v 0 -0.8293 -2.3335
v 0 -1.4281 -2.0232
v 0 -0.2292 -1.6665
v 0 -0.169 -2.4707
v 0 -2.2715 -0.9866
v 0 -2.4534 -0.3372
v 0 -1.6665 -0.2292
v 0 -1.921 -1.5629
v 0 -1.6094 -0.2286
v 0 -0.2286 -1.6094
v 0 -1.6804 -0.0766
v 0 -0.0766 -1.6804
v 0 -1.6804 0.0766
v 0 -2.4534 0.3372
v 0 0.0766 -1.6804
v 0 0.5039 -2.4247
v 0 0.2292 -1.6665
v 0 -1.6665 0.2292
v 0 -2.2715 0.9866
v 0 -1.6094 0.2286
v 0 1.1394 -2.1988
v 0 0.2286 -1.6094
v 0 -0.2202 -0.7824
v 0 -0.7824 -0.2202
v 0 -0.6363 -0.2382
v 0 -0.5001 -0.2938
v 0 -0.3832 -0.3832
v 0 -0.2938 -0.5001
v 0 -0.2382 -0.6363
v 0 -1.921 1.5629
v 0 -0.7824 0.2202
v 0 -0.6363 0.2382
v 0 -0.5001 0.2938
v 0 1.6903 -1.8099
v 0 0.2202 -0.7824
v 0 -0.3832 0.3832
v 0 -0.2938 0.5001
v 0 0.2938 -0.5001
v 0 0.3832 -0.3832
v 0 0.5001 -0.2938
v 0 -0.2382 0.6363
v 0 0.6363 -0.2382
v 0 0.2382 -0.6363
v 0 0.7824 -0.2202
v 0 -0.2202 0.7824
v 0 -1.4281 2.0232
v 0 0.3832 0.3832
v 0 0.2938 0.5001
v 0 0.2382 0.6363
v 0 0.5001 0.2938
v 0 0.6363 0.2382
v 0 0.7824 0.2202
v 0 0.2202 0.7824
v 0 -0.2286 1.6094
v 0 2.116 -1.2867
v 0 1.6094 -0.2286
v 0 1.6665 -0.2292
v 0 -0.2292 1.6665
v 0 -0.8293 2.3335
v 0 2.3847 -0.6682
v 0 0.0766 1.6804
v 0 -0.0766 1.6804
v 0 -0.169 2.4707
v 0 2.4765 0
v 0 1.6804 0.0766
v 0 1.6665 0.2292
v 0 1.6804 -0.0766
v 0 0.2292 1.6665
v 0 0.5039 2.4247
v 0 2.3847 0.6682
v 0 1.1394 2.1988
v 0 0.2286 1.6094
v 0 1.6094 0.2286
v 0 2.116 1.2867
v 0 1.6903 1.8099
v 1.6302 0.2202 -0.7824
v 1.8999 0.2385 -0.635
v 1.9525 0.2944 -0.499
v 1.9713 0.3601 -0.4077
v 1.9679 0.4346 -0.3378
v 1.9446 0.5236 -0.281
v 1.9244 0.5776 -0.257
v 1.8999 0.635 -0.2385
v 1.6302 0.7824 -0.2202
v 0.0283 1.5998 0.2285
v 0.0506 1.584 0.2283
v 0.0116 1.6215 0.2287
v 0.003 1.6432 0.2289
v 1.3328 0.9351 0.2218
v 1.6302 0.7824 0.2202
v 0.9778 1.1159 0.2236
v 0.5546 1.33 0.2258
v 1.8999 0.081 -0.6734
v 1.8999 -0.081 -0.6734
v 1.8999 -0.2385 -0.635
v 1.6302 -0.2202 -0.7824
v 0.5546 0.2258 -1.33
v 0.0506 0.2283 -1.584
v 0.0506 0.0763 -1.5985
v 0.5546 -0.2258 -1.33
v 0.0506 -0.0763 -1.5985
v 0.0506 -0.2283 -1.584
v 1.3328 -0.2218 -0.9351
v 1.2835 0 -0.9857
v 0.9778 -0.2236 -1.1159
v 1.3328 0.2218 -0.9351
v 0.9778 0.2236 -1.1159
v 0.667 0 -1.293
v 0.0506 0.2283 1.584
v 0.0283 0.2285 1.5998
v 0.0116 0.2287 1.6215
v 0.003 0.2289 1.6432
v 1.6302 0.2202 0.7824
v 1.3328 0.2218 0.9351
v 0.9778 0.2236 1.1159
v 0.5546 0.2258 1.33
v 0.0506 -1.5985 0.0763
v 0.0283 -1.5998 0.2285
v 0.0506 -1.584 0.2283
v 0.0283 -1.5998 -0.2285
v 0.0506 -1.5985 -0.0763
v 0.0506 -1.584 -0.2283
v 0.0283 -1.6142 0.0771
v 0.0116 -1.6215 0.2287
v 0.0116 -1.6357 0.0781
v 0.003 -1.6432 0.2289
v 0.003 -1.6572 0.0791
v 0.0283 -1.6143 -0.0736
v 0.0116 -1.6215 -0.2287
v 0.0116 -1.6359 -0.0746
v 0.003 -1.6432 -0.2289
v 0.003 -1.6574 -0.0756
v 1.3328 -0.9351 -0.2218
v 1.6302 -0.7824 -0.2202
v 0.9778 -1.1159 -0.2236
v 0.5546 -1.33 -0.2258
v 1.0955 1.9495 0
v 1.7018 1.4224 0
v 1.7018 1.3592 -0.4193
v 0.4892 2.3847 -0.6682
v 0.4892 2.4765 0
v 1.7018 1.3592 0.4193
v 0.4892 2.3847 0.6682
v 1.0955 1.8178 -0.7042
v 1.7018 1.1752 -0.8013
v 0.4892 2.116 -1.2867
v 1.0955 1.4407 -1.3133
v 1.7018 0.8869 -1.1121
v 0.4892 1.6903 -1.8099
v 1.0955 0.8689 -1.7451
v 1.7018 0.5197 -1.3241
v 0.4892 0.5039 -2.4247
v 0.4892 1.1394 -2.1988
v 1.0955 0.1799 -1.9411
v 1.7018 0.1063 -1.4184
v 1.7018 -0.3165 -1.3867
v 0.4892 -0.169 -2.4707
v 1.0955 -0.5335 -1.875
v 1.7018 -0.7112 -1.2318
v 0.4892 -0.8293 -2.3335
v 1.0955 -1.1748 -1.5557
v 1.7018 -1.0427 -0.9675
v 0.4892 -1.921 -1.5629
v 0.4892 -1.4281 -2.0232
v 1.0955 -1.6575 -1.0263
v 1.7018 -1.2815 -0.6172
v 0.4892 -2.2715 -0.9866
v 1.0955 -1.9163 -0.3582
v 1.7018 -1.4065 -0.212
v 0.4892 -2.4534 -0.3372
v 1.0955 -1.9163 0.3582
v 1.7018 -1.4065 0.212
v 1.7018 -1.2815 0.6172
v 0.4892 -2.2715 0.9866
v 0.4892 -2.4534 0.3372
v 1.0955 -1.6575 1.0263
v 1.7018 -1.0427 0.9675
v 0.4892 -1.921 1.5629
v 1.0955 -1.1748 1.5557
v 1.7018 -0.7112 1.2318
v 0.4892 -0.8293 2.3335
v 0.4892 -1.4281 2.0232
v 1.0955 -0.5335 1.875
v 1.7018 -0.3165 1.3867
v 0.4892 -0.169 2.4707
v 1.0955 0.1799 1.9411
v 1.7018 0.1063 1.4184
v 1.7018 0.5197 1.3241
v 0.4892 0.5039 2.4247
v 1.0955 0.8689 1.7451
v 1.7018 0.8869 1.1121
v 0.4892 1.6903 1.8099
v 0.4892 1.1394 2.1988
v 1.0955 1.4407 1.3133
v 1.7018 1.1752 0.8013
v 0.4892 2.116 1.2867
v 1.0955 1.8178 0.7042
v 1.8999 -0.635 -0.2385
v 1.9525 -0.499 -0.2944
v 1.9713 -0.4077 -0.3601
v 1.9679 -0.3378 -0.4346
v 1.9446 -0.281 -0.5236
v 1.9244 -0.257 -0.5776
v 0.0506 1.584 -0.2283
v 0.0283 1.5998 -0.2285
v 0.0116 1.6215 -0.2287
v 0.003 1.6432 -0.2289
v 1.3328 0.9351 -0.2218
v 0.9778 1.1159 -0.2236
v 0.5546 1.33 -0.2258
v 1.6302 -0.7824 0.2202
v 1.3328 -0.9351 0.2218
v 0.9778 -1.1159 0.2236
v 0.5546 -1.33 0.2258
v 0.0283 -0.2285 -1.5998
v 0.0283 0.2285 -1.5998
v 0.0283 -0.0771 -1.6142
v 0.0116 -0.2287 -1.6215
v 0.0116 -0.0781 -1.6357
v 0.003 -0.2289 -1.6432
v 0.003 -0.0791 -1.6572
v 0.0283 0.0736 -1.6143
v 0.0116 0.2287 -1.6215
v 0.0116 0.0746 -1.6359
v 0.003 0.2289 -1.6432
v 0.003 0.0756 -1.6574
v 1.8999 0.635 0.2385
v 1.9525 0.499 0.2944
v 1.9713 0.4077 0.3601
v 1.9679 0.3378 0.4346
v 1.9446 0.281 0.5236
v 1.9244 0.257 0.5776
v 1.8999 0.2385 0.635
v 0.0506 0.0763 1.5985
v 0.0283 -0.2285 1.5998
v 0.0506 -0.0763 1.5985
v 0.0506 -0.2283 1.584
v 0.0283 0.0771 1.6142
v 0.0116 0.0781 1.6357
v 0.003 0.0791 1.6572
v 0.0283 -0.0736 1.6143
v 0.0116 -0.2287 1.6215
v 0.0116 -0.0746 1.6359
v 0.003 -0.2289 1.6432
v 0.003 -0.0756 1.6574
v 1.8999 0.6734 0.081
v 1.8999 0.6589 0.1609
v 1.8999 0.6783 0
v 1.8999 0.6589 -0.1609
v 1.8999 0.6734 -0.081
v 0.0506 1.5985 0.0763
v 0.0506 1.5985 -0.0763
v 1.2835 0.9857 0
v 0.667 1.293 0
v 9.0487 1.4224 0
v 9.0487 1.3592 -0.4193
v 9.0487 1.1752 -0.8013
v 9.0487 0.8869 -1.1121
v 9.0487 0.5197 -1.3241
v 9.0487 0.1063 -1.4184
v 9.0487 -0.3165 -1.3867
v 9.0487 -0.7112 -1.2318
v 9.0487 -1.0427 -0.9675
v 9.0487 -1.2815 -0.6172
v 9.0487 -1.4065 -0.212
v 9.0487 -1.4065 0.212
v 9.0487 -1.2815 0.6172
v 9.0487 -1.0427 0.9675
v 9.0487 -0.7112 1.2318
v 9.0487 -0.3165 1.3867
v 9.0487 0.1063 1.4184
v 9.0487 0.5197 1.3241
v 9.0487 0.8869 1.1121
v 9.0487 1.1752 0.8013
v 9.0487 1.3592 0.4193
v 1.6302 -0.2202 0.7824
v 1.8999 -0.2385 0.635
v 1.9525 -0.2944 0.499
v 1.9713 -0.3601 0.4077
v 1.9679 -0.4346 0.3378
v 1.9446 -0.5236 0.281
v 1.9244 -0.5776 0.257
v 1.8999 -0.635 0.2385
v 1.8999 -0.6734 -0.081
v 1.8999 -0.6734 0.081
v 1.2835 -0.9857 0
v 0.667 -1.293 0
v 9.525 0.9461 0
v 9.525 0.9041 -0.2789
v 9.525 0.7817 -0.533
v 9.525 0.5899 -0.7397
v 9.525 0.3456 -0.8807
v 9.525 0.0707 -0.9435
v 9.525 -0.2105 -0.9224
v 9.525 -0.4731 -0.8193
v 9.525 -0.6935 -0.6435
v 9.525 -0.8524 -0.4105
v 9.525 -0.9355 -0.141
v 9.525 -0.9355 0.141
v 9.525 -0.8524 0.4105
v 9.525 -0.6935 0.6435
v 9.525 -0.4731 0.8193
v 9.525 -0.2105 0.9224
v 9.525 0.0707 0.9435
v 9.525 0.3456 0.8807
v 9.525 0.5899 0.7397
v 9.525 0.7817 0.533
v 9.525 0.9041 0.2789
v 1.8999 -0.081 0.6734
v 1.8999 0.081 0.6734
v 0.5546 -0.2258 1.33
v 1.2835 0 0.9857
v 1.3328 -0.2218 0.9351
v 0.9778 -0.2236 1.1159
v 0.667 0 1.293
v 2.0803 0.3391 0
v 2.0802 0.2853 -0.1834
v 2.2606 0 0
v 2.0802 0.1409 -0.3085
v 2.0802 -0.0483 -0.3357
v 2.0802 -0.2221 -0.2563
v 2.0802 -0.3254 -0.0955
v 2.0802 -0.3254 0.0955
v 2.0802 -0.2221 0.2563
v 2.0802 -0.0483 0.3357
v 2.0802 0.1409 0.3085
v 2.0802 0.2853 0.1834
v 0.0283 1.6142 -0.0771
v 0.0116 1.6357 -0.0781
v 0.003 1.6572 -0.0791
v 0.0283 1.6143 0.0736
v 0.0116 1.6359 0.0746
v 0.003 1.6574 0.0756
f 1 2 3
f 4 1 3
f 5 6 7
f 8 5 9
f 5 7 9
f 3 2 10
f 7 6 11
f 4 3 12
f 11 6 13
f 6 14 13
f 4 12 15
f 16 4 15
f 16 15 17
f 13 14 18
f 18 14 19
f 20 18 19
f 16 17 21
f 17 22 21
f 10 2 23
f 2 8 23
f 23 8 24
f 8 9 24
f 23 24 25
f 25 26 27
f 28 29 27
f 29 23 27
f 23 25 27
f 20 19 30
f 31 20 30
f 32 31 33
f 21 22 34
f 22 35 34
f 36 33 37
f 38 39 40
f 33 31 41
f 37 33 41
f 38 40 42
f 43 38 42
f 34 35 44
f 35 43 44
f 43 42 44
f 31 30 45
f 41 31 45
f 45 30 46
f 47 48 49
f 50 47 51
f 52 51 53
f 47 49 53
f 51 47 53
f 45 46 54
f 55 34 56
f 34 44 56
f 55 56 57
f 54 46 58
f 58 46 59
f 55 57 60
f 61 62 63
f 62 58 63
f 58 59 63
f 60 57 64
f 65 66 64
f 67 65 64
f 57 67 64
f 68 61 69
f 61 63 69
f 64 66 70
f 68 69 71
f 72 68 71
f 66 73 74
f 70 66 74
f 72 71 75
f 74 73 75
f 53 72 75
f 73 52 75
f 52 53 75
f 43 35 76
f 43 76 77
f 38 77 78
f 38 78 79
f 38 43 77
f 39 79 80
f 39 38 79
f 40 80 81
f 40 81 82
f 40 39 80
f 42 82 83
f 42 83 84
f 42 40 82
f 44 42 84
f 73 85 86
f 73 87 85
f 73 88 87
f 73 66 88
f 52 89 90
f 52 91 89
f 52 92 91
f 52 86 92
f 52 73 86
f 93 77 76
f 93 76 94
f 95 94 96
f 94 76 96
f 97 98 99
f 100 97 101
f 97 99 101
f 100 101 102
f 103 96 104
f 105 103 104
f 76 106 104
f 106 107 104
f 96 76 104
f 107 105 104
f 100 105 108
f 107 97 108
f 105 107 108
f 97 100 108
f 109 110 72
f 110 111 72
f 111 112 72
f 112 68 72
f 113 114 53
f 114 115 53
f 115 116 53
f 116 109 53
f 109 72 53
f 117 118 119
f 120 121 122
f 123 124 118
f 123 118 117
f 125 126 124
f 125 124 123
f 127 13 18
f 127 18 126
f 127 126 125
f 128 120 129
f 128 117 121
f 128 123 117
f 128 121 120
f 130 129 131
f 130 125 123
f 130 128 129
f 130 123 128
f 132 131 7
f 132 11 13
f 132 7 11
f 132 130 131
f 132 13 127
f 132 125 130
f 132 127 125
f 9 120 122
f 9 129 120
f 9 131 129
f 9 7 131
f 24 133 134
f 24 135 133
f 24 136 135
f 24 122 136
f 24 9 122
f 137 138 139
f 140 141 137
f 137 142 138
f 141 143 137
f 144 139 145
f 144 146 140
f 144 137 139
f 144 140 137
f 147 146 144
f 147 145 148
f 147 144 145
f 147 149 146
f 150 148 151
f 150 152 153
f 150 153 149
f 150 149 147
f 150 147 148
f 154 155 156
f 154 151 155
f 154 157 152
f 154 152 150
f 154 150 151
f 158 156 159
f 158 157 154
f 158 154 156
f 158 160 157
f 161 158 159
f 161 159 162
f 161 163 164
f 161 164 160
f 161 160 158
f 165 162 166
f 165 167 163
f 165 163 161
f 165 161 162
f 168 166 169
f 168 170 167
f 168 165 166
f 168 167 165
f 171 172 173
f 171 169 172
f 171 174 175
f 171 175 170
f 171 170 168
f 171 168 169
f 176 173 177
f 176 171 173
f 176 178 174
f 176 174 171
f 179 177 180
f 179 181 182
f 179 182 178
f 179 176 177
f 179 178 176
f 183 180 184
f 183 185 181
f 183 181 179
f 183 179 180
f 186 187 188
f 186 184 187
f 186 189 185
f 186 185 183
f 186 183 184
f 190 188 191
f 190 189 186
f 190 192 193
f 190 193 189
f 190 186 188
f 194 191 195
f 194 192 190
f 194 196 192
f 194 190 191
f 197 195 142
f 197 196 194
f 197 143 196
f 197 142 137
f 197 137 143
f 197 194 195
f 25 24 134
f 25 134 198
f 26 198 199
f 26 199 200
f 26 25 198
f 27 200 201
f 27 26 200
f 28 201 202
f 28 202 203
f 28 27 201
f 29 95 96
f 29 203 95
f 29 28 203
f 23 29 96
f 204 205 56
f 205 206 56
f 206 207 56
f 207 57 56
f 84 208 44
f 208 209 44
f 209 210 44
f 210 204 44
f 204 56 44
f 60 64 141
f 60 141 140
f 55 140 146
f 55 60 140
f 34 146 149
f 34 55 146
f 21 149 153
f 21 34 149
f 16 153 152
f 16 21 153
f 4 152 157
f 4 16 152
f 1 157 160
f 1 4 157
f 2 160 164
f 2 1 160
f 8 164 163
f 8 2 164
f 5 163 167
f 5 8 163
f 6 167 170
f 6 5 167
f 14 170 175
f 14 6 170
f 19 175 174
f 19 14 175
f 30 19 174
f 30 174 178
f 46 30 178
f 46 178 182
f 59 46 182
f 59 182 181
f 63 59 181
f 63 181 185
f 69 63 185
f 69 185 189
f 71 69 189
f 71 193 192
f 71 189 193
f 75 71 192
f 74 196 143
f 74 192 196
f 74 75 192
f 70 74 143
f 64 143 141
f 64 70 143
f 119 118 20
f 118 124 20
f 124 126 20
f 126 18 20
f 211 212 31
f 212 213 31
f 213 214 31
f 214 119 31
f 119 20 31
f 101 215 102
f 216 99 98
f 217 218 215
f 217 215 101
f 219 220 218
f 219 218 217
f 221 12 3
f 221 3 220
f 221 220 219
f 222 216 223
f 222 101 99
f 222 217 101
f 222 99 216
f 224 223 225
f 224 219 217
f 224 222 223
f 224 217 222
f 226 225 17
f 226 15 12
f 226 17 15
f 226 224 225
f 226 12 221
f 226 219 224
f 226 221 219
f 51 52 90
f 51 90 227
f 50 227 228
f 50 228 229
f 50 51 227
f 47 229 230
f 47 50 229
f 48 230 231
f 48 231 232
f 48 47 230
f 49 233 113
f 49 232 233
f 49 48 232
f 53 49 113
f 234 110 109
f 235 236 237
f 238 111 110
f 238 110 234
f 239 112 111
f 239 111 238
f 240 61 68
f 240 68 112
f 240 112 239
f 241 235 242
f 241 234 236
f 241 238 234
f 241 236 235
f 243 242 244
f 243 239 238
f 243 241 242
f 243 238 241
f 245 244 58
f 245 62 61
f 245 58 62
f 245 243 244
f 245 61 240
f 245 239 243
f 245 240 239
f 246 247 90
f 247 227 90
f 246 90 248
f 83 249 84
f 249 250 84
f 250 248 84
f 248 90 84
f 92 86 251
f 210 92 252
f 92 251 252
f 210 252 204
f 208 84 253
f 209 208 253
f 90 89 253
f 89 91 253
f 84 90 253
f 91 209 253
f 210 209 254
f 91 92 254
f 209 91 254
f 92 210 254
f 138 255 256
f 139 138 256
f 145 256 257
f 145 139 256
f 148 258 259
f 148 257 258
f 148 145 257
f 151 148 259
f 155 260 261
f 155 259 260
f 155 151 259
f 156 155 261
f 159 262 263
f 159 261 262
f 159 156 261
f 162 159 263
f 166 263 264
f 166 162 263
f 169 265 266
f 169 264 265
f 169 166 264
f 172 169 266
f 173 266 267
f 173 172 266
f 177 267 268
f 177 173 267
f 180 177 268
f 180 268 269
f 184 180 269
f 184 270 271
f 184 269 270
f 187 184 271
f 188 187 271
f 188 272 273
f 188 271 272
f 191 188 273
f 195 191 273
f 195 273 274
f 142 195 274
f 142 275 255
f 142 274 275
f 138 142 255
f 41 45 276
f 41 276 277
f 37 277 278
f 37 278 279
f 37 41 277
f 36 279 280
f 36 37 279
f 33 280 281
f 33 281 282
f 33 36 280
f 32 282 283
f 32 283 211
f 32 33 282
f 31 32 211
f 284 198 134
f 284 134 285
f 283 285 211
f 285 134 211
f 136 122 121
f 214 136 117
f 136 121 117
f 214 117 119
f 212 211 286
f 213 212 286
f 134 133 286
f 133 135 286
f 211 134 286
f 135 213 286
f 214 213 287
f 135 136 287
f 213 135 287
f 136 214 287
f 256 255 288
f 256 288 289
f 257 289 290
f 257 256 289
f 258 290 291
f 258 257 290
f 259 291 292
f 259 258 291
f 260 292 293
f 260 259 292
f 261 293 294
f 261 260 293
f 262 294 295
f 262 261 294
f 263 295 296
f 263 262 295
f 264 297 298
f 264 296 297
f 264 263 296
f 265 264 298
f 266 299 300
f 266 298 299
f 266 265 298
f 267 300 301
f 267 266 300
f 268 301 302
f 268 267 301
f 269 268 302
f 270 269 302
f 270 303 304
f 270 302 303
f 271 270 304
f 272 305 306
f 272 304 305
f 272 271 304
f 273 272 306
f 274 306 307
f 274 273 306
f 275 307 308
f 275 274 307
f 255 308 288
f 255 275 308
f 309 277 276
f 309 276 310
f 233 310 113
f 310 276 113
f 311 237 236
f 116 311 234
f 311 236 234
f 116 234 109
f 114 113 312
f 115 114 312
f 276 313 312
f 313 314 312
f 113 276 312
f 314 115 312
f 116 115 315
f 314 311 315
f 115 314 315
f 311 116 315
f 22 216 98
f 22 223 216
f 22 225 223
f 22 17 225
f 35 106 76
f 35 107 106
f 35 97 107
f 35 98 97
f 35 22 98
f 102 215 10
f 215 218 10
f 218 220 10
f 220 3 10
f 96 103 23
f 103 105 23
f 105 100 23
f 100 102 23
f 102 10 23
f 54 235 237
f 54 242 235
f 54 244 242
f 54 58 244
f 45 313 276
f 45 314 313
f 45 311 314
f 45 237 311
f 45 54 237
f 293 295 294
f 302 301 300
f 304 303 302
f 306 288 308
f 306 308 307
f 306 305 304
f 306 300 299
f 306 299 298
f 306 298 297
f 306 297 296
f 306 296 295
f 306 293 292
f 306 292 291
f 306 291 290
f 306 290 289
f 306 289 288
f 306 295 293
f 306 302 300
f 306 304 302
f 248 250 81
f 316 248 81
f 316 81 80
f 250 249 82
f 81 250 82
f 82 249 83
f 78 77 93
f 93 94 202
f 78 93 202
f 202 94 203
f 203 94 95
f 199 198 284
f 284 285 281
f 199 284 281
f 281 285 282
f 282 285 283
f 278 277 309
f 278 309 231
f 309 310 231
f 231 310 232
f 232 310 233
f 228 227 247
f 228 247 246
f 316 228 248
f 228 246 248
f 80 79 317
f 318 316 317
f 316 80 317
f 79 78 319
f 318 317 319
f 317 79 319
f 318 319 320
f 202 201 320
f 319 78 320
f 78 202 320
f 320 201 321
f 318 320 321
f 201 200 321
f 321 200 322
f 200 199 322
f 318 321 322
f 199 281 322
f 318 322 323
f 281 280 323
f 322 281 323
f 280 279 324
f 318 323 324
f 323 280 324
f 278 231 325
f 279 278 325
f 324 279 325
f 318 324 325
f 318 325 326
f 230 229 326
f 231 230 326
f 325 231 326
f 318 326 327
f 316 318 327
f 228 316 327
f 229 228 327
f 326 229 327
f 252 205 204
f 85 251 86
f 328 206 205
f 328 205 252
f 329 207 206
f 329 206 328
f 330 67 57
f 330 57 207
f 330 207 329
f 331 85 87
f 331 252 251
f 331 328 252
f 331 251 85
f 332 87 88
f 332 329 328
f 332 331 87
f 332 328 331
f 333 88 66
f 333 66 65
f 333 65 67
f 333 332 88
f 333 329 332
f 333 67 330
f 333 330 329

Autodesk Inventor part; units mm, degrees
ref_plane "YZ Plane" through (0, 0, 0) normal (1, 0, 0) x (0, 1, 0)
ref_plane "XZ Plane" through (0, 0, 0) normal (0, 1, 0) x (-1, 0, 0)
sketch "Sketch1" plane through (0, 0, 0) normal (0, 0, 1) x (1, 0, 0)
  line L0 (2.2606, 0) -> (9.525, 0)
  line L1 (9.525, 0) -> (9.525, 1.4224)
  line L2 (9.525, 1.4224) -> (1.7018, 1.4224)
  line L3 (0.4892, 2.4765) -> (0, 2.4765)
  line L4 (-1.905, 0) -> (11.43, 0) projected
  line L5 (0, -0.4953) -> (0, 2.9718) projected
  line L6 (0, 1.6256) -> (1.8999, 0.6783)
  line L7 (1.8999, 0.6783) -> (2.2606, 0)
  line L8 (1.7018, 1.4224) -> (0.4892, 2.4765)
  line L9 (0, 2.4765) -> (0, 1.6256)
  dimension "d2" = 2.8448
  dimension "d3" = 4.953
  dimension "d4" = 2.2606
  dimension "d5" = 3.2512
  dimension "d6" = 26.5
  dimension "d7" = 62
  dimension "d13" = 41
  dimension "d14" = 1.7018
  dimension "d15" = 9.525
revolve "Body" add sketch "Sketch1" angle 360 about axis through (2.2606, 0, 0) along (1, 0, 0) contours L7 L6 L5 L3 L8 L2 L1 L0
sketch "Sketch2" plane through (0, 0, 0) normal (-1, 0, 0) x (0, 0, 1)
  line L0 (0, -3.4671) -> (0, 3.4671) projected
  line L1 (-3.4671, 0) -> (3.4671, 0) projected
  line L2 (0, 1.6256) -> (0, 0) construction
  line L3 (0, 0) -> (1.6256, 0) construction
  arc A0 (0.5419, 0) -> (0, 0.5419) centre (0, 0) ccw
  line L4 (0, 0) -> (0.7947, 0.7947) construction
  arc A1 (0.8128, 0) -> (0, 0.8128) centre (0, 0) ccw construction
  line L5 (0.2286, 1.6094) -> (0.2202, 0.7824)
  line L6 (1.6094, 0.2286) -> (0.7824, 0.2202)
  arc A2 (0.2202, 0.7824) -> (0.7824, 0.2202) centre (0.7767, 0.7767) ccw
  arc A3 (1.6256, 0) -> (1.6094, 0.2286) centre (0, 0) ccw
  arc A4 (0.2286, 1.6094) -> (0, 1.6256) centre (0, 0) ccw
  arc A5 (1.6094, 0.2286) -> (0.2286, 1.6094) centre (0, 0) ccw
  line L7 (0.2286, -1.6094) -> (0.2202, -0.7824)
  line L8 (1.6094, -0.2286) -> (0.7824, -0.2202)
  arc A6 (0.7824, -0.2202) -> (0.2202, -0.7824) centre (0.7767, -0.7767) ccw
  arc A7 (1.6094, -0.2286) -> (1.6256, 0) centre (0, 0) ccw
  arc A8 (0, -1.6256) -> (0.2286, -1.6094) centre (0, 0) ccw
  arc A9 (0.2286, -1.6094) -> (1.6094, -0.2286) centre (0, 0) ccw
  line L9 (-0.2286, 1.6094) -> (-0.2202, 0.7824)
  line L10 (-1.6094, 0.2286) -> (-0.7824, 0.2202)
  arc A10 (-0.7824, 0.2202) -> (-0.2202, 0.7824) centre (-0.7767, 0.7767) ccw
  arc A11 (-1.6094, 0.2286) -> (-1.6256, 0) centre (0, 0) ccw
  arc A12 (0, 1.6256) -> (-0.2286, 1.6094) centre (0, 0) ccw
  arc A13 (-0.2286, 1.6094) -> (-1.6094, 0.2286) centre (0, 0) ccw
  arc A14 (-1.6094, -0.2286) -> (-0.2286, -1.6094) centre (0, 0) ccw
  arc A15 (-0.2286, -1.6094) -> (0, -1.6256) centre (0, 0) ccw
  arc A16 (-1.6256, 0) -> (-1.6094, -0.2286) centre (0, 0) ccw
  line L11 (-1.6094, -0.2286) -> (-0.7824, -0.2202)
  arc A17 (-0.2202, -0.7824) -> (-0.7824, -0.2202) centre (-0.7767, -0.7767) ccw
  line L12 (-0.2286, -1.6094) -> (-0.2202, -0.7824)
  dimension "d18" = 45
  dimension "d19" = 1.0837
  dimension "d20" = 1.6256
  dimension "d21" = 3.2512
  dimension "d22" = 0.2286
extrude "Slot" add sketch "Sketch2" against normal up to next contours A2 L5 A5 L6 | L9 A10 L10 A13 | L7 A6 L8 A9 | A14 L11 A17 L12
fillet "Fillet1" radius 0.0914 4 edges at (0, 1.6256, 0) (0, 0, 1.6256) (0, -1.6256, 0) (0, 0, -1.6256)
thread "Thread" size "4-40 UNC" class "2A" standard "ANSI Unified Screw Threads" length 6.2357
chamfer "Chamfer1" distance 0.4763 distance2 0.4763 1 edges at (9.525, -1.4224, 0) measured on face at (9.525, 0.2736, 0.8712)
ref_plane "Work Plane2" through (2.032, 0, 0) normal (0, 1, 0) x (1, 0, 0)
equation "\"d2\" = GD"
equation "\"d3\" = KOD"
equation "\"d4\" = INTI"
equation "\"d5\" = SDM"
equation "\"d13\" = 0.5 * SEWI"
equation "\"d14\" = KOH"
equation "\"d15\" = NLG"
equation "\"d19\" = 0.333333 * SDM"
equation "\"d20\" = 0.5 * SDM"
equation "\"d21\" = SDM"
equation "\"d22\" = 0.5 * SBR"
equation "\"d45\" = INTI"
equation "\"d25\" = 0.2 * SBR"
equation "\"d9\" = GEL"
equation "\"d11\" = -0.5 * SPD + 0.5 * GD"
equation "\"d12\" = GUL"
equation "\"GD\" = NND"
equation "\"NLG\" = 9.525"
equation "\"GEL\" = 6.2357"
equation "\"KOD\" = 4.953"
equation "\"KOH\" = 1.7018"
equation "\"SDM\" = 3.2512"
equation "\"INTI\" = 2.2606"
equation "\"SBR\" = 0.4572"
equation "\"GUL\" = 0.75 * GAL"
equation "\"SPD\" = 1.8923"
equation "\"SEWI\" = 82deg"
equation "\"d0\" = NLG"
equation "\"d1\" = KOH"
equation "\"d17\" = SDM"
equation "\"TOA\" = 30deg"
equation "\"THREADDIA\" = 2.8448"
equation "\"BDM\" = NND"
equation "\"NND\" = 2.8448"
equation "\"GAL\" = 0.635"
equation "\"GD1\" = SPD"
properties part number "ANSI B18.6.3 - 4-40 x 3/8, CRFCHMSTII(5)" material "Steel, Mild"
